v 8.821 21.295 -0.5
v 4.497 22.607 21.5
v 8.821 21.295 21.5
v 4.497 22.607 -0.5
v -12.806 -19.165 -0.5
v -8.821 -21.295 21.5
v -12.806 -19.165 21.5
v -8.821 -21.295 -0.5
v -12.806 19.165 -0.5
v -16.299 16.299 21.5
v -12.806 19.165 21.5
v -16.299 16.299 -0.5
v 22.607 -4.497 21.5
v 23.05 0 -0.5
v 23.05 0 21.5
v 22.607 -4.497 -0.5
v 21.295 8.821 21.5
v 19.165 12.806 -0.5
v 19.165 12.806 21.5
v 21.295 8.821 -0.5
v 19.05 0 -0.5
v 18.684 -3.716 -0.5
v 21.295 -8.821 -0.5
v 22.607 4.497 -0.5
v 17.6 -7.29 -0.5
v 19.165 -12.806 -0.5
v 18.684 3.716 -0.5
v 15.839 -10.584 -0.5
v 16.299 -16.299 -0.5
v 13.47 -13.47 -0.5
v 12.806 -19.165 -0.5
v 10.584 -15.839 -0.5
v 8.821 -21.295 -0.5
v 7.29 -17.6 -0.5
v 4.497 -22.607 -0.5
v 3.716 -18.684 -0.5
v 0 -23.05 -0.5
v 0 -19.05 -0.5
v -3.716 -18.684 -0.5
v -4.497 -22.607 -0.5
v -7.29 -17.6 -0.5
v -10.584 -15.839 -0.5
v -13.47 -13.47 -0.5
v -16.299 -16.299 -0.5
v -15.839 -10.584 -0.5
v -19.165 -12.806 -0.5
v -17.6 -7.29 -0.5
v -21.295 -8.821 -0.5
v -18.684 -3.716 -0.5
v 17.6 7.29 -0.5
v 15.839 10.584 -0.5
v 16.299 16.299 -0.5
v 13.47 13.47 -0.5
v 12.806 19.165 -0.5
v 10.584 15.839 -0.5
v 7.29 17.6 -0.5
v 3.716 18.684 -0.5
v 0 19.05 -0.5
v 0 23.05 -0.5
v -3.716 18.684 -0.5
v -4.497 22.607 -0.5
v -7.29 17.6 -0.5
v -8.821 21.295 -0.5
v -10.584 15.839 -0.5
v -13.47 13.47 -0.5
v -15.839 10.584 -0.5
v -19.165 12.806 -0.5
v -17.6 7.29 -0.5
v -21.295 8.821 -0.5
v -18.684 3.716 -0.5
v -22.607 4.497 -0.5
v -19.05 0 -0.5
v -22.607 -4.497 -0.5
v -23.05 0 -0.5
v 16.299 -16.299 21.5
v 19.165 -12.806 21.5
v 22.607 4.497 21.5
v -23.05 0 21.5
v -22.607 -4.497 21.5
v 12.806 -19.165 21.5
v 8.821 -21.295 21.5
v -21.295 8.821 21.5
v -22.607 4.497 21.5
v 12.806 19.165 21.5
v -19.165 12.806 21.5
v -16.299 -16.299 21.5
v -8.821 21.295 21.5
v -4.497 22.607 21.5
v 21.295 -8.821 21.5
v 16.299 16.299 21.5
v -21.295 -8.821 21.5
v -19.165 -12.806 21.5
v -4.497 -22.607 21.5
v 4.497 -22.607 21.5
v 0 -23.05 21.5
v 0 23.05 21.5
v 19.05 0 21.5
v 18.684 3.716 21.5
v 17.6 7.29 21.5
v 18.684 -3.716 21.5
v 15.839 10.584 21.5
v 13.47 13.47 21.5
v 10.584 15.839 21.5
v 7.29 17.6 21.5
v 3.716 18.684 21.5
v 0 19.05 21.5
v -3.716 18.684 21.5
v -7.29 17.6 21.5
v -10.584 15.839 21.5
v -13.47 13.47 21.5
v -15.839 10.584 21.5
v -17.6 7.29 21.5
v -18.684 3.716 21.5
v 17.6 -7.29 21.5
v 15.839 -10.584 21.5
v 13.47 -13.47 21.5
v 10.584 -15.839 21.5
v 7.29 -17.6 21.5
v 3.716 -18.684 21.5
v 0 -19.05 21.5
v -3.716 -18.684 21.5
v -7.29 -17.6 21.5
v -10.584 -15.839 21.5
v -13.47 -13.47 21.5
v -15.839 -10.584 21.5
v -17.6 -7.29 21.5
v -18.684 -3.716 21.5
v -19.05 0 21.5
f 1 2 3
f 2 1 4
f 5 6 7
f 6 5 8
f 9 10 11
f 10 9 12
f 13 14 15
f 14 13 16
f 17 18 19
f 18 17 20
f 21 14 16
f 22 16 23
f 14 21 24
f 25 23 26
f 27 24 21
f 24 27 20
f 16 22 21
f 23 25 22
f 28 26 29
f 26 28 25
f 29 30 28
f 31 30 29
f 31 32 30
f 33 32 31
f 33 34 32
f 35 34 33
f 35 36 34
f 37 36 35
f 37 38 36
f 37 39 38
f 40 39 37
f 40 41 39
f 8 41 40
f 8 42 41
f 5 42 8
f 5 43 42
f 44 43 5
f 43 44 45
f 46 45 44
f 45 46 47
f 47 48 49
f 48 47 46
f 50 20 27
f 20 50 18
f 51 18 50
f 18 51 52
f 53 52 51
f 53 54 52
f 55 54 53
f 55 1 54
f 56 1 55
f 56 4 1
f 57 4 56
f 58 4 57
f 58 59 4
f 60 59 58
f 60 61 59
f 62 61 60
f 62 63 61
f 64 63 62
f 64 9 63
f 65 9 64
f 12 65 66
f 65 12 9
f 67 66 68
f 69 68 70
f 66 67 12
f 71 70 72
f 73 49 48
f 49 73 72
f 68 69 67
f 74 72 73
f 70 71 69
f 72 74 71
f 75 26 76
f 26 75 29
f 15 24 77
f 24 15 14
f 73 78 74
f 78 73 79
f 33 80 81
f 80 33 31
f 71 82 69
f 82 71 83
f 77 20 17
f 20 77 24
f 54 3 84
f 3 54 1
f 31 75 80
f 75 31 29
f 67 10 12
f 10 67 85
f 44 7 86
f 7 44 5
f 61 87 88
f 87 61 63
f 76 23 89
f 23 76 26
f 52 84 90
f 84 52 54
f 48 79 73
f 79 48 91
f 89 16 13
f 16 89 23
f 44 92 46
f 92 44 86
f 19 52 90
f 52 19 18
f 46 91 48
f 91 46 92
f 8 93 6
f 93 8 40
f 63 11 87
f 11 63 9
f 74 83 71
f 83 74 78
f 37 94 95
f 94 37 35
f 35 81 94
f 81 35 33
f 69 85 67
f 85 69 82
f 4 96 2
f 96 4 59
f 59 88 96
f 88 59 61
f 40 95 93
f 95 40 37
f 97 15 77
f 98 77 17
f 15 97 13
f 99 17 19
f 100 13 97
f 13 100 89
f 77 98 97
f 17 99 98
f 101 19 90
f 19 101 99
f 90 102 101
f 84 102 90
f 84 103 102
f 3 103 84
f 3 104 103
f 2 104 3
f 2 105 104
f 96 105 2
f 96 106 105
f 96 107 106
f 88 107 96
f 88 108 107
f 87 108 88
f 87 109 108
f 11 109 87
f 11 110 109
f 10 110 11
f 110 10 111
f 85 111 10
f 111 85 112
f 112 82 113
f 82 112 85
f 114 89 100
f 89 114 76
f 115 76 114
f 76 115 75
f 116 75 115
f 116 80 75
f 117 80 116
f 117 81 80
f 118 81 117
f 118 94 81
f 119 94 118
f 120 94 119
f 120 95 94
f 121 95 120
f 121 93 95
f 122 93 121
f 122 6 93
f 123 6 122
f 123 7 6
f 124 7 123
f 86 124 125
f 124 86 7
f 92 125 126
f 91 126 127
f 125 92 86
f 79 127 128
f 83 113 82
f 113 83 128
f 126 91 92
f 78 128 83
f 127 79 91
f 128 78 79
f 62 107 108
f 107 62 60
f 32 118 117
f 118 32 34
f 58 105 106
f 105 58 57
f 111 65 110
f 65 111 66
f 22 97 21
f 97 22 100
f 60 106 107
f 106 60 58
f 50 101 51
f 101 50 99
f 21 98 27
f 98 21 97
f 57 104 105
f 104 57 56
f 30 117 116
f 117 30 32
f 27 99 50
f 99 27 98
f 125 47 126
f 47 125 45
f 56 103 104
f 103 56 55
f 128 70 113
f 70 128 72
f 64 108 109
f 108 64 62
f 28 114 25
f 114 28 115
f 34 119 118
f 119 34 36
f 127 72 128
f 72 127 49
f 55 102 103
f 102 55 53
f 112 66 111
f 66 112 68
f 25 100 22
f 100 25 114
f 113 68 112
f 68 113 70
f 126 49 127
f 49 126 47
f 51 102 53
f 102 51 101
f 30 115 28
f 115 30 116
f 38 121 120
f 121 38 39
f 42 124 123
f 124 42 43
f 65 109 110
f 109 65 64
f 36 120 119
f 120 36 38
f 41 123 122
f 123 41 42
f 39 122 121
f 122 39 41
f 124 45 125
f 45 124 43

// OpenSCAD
$fn = 32;

// ----------------------------------------------------------------------
// Two-module gear rim: z14 m2.5 and z14 m2.5, 21 mm wide
// ----------------------------------------------------------------------

// --- parameters (mm) ---
module_a = 2.5;           // first tooth module
teeth_a = 14;             // first band tooth count
module_b = 2.5;           // second tooth module
teeth_b = 14;             // second band tooth count
band_h = 8;               // height of one tooth band
web_t = 5;                // web thickness between the bands
total = 21;               // overall width over both bands
root_r = 14.38;           // root radius of the coarse band
hub_r = 23.05;            // hub radius
bore_d = 38.1;            // hub bore
hole_count = 5;           // lightening holes
hole_r = 10.94;           // lightening hole circle radius
hole_d = 4;               // lightening hole diameter

band_a = [[14.259, -1.82], [17.559, -1.916], [18.774, -1.469], [19.984, -0.807], [19.984, 0.807], [18.774, 1.469], [17.559, 1.916], [14.259, 1.82], [13.637, 4.547], [16.651, 5.892], [17.552, 6.823], [18.355, 7.943], [17.654, 9.398], [16.278, 9.469], [14.989, 9.345], [12.058, 7.827], [10.313, 10.014], [12.446, 12.533], [12.854, 13.763], [13.091, 15.121], [11.828, 16.127], [10.557, 15.594], [9.45, 14.923], [7.468, 12.283], [4.947, 13.497], [5.775, 16.692], [5.609, 17.977], [5.234, 19.303], [3.66, 19.662], [2.746, 18.63], [2.039, 17.545], [1.399, 14.307], [-1.399, 14.307], [-2.039, 17.545], [-2.746, 18.63], [-3.66, 19.662], [-5.234, 19.303], [-5.609, 17.977], [-5.775, 16.692], [-4.947, 13.497], [-7.468, 12.283], [-9.45, 14.923], [-10.557, 15.594], [-11.828, 16.127], [-13.091, 15.121], [-12.854, 13.763], [-12.446, 12.533], [-10.313, 10.014], [-12.058, 7.827], [-14.989, 9.345], [-16.278, 9.469], [-17.654, 9.398], [-18.355, 7.943], [-17.552, 6.823], [-16.651, 5.892], [-13.637, 4.547], [-14.259, 1.82], [-17.559, 1.916], [-18.774, 1.469], [-19.984, 0.807], [-19.984, -0.807], [-18.774, -1.469], [-17.559, -1.916], [-14.259, -1.82], [-13.637, -4.547], [-16.651, -5.892], [-17.552, -6.823], [-18.355, -7.943], [-17.654, -9.398], [-16.278, -9.469], [-14.989, -9.345], [-12.058, -7.827], [-10.313, -10.014], [-12.446, -12.533], [-12.854, -13.763], [-13.091, -15.121], [-11.828, -16.127], [-10.557, -15.594], [-9.45, -14.923], [-7.468, -12.283], [-4.947, -13.497], [-5.775, -16.692], [-5.609, -17.977], [-5.234, -19.303], [-3.66, -19.662], [-2.746, -18.63], [-2.039, -17.545], [-1.399, -14.307], [1.399, -14.307], [2.039, -17.545], [2.746, -18.63], [3.66, -19.662], [5.234, -19.303], [5.609, -17.977], [5.775, -16.692], [4.947, -13.497], [7.468, -12.283], [9.45, -14.923], [10.557, -15.594], [11.828, -16.127], [13.091, -15.121], [12.854, -13.763], [12.446, -12.533], [10.313, -10.014], [12.058, -7.827], [14.989, -9.345], [16.278, -9.469], [17.654, -9.398], [18.355, -7.943], [17.552, -6.823], [16.651, -5.892], [13.637, -4.547]];
band_b = [[14.259, -1.82], [17.559, -1.916], [18.774, -1.469], [19.984, -0.807], [19.984, 0.807], [18.774, 1.469], [17.559, 1.916], [14.259, 1.82], [13.637, 4.547], [16.651, 5.892], [17.552, 6.823], [18.355, 7.943], [17.654, 9.398], [16.278, 9.469], [14.989, 9.345], [12.058, 7.827], [10.313, 10.014], [12.446, 12.533], [12.854, 13.763], [13.091, 15.121], [11.828, 16.127], [10.557, 15.594], [9.45, 14.923], [7.468, 12.283], [4.947, 13.497], [5.775, 16.692], [5.609, 17.977], [5.234, 19.303], [3.66, 19.662], [2.746, 18.63], [2.039, 17.545], [1.399, 14.307], [-1.399, 14.307], [-2.039, 17.545], [-2.746, 18.63], [-3.66, 19.662], [-5.234, 19.303], [-5.609, 17.977], [-5.775, 16.692], [-4.947, 13.497], [-7.468, 12.283], [-9.45, 14.923], [-10.557, 15.594], [-11.828, 16.127], [-13.091, 15.121], [-12.854, 13.763], [-12.446, 12.533], [-10.313, 10.014], [-12.058, 7.827], [-14.989, 9.345], [-16.278, 9.469], [-17.654, 9.398], [-18.355, 7.943], [-17.552, 6.823], [-16.651, 5.892], [-13.637, 4.547], [-14.259, 1.82], [-17.559, 1.916], [-18.774, 1.469], [-19.984, 0.807], [-19.984, -0.807], [-18.774, -1.469], [-17.559, -1.916], [-14.259, -1.82], [-13.637, -4.547], [-16.651, -5.892], [-17.552, -6.823], [-18.355, -7.943], [-17.654, -9.398], [-16.278, -9.469], [-14.989, -9.345], [-12.058, -7.827], [-10.313, -10.014], [-12.446, -12.533], [-12.854, -13.763], [-13.091, -15.121], [-11.828, -16.127], [-10.557, -15.594], [-9.45, -14.923], [-7.468, -12.283], [-4.947, -13.497], [-5.775, -16.692], [-5.609, -17.977], [-5.234, -19.303], [-3.66, -19.662], [-2.746, -18.63], [-2.039, -17.545], [-1.399, -14.307], [1.399, -14.307], [2.039, -17.545], [2.746, -18.63], [3.66, -19.662], [5.234, -19.303], [5.609, -17.977], [5.775, -16.692], [4.947, -13.497], [7.468, -12.283], [9.45, -14.923], [10.557, -15.594], [11.828, -16.127], [13.091, -15.121], [12.854, -13.763], [12.446, -12.533], [10.313, -10.014], [12.058, -7.827], [14.989, -9.345], [16.278, -9.469], [17.654, -9.398], [18.355, -7.943], [17.552, -6.823], [16.651, -5.892], [13.637, -4.547]];

difference() {
  union() {
    /* tooth band A, overlapping the web by 0.4 mm */
    linear_extrude(height = band_h + 0.4) polygon(band_a);
    /* web */
    translate([0, 0, band_h - 0.4]) cylinder(h = web_t + 0.8, d = 2 * root_r);
    /* tooth band B */
    translate([0, 0, band_h + web_t]) linear_extrude(height = band_h + 0.4) polygon(band_b);
    /* hub */
    translate([0, 0, -0.5]) cylinder(h = total + 1.0, d = 2 * hub_r);
  }
  /* bore */
  translate([0, 0, -2.5]) cylinder(h = total + 5, d = bore_d);
  /* lightening holes through the web */
  for (i = [0 : hole_count - 1]) {
    a = i * 360 / hole_count;
    translate([hole_r * cos(a), hole_r * sin(a), -2.5]) cylinder(h = total + 5, d = hole_d);
  }
}
